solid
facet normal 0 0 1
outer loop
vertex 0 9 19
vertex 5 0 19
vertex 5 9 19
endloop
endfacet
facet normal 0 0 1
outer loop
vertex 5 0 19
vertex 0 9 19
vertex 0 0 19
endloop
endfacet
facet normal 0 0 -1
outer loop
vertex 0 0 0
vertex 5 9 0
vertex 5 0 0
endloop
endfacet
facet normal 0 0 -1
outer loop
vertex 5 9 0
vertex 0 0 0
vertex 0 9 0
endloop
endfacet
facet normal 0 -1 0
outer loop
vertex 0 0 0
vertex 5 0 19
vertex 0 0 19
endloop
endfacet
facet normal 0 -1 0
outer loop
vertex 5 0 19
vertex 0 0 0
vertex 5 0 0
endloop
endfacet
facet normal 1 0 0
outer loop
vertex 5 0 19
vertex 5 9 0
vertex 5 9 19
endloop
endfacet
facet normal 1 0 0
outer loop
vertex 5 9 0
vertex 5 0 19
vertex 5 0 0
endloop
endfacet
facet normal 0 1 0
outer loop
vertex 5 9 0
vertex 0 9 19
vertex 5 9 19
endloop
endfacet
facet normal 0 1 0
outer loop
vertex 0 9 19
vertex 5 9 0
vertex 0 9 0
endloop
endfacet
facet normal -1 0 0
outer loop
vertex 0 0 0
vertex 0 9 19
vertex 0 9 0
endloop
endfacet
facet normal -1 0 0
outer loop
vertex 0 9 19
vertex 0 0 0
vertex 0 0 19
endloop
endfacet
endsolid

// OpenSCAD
// Generated by SolidPython 1.0.1 on 2020-07-29 00:39:26


cube(size = [5, 9, 19]);
/***********************************************
*********      SolidPython code:      **********
************************************************
 
# import packages: SolidPython
from solid import *
from solid.utils import *
from itertools import chain, combinations


class Resize:

    def __init__(self, scad_file):
        self.scad_file = scad_file
        #self.scad_file = import_scad(scad_file)
        # cone/cylinder param:
        self.r1 = 0
        self.r2 = 0
        self.h = 0
        # rectangular prism param:
        self.w = 0
        self.l = 0
        # ellipse param:
        self.r = 0

    # import OpenScad code (file name corresponds to shape)


    # classify shape + parameters
    def assign(self, param1, param2, param3):
        if self.scad_file == 'cone.scad':
            self.r1 = param1
            self.r2 = param2
            self.h = param3
        elif self.scad_file == 'cylinder.scad':
            self.r1 = param1
            self.r2 = param2
            self.h = param3
        elif self.scad_file == 'rectangularPrism.scad':
            self.h = param1
            self.l = param2
            self.w = param3
        else:
            self.r = param1
            self.h = param2

    # resize parameters
    def iterate(self):
        x = range(3, 20, 2)
        i = 1
        if self.scad_file == 'cone.scad':
            tempList = list(combinations(x, 2))
            for temp in tempList:
                param1 = temp[0]
                param2 = temp[1]
                filepath = 'produced_scad_files/' + 'cone' + str(param1) + '_' + str(param2) + '_' + '.scad'
                scad_render_to_file(cylinder(h=param1, r1=param2, r2=0), filepath)

        elif self.scad_file == 'cylinder.scad':
            tempList = list(combinations(x, 3))
            for temp in tempList:
                param1 = temp[0]
                param2 = temp[1]
                filepath = 'produced_scad_files/' + 'cylinder' + str(param1) + '_' + str(param2) + '_' + '.scad'
                scad_render_to_file(cylinder(h=param1, r1=param2, r2=param2), filepath)

        elif self.scad_file == 'rectangularPrism.scad':
            tempList = list(combinations(x, 3))
            for temp in tempList:
                param1 = temp[0]
                param2 = temp[1]
                param3 = temp[2]
                filepath = 'produced_scad_files/' + 'rectangularPrism' + str(param1) + '_' + str(param2) + '_' + str(
                    param3) + '.scad'
                scad_render_to_file(cube(size=(param1, param2, param3)), filepath)

        elif self.scad_file == 'ellipse.scad':
            tempList = list(combinations(x, 4))
            for temp in tempList:
                param1 = temp[0]
                param2 = temp[1]
                param3 = temp[2]
                param4 = temp[3]
                filepath = 'produced_scad_files/' + 'ellipse' + str(param1) + '_' + str(param2) + '_' + str(param3) + '_' + str(param4) + '.scad'
                scad_render_to_file(scale([param1, param2, param3])(sphere(r=param4)), filepath)

    def render_to_scadfile(self):
        scad_render_to_file(scad, 'example.scad') 
 
************************************************/
